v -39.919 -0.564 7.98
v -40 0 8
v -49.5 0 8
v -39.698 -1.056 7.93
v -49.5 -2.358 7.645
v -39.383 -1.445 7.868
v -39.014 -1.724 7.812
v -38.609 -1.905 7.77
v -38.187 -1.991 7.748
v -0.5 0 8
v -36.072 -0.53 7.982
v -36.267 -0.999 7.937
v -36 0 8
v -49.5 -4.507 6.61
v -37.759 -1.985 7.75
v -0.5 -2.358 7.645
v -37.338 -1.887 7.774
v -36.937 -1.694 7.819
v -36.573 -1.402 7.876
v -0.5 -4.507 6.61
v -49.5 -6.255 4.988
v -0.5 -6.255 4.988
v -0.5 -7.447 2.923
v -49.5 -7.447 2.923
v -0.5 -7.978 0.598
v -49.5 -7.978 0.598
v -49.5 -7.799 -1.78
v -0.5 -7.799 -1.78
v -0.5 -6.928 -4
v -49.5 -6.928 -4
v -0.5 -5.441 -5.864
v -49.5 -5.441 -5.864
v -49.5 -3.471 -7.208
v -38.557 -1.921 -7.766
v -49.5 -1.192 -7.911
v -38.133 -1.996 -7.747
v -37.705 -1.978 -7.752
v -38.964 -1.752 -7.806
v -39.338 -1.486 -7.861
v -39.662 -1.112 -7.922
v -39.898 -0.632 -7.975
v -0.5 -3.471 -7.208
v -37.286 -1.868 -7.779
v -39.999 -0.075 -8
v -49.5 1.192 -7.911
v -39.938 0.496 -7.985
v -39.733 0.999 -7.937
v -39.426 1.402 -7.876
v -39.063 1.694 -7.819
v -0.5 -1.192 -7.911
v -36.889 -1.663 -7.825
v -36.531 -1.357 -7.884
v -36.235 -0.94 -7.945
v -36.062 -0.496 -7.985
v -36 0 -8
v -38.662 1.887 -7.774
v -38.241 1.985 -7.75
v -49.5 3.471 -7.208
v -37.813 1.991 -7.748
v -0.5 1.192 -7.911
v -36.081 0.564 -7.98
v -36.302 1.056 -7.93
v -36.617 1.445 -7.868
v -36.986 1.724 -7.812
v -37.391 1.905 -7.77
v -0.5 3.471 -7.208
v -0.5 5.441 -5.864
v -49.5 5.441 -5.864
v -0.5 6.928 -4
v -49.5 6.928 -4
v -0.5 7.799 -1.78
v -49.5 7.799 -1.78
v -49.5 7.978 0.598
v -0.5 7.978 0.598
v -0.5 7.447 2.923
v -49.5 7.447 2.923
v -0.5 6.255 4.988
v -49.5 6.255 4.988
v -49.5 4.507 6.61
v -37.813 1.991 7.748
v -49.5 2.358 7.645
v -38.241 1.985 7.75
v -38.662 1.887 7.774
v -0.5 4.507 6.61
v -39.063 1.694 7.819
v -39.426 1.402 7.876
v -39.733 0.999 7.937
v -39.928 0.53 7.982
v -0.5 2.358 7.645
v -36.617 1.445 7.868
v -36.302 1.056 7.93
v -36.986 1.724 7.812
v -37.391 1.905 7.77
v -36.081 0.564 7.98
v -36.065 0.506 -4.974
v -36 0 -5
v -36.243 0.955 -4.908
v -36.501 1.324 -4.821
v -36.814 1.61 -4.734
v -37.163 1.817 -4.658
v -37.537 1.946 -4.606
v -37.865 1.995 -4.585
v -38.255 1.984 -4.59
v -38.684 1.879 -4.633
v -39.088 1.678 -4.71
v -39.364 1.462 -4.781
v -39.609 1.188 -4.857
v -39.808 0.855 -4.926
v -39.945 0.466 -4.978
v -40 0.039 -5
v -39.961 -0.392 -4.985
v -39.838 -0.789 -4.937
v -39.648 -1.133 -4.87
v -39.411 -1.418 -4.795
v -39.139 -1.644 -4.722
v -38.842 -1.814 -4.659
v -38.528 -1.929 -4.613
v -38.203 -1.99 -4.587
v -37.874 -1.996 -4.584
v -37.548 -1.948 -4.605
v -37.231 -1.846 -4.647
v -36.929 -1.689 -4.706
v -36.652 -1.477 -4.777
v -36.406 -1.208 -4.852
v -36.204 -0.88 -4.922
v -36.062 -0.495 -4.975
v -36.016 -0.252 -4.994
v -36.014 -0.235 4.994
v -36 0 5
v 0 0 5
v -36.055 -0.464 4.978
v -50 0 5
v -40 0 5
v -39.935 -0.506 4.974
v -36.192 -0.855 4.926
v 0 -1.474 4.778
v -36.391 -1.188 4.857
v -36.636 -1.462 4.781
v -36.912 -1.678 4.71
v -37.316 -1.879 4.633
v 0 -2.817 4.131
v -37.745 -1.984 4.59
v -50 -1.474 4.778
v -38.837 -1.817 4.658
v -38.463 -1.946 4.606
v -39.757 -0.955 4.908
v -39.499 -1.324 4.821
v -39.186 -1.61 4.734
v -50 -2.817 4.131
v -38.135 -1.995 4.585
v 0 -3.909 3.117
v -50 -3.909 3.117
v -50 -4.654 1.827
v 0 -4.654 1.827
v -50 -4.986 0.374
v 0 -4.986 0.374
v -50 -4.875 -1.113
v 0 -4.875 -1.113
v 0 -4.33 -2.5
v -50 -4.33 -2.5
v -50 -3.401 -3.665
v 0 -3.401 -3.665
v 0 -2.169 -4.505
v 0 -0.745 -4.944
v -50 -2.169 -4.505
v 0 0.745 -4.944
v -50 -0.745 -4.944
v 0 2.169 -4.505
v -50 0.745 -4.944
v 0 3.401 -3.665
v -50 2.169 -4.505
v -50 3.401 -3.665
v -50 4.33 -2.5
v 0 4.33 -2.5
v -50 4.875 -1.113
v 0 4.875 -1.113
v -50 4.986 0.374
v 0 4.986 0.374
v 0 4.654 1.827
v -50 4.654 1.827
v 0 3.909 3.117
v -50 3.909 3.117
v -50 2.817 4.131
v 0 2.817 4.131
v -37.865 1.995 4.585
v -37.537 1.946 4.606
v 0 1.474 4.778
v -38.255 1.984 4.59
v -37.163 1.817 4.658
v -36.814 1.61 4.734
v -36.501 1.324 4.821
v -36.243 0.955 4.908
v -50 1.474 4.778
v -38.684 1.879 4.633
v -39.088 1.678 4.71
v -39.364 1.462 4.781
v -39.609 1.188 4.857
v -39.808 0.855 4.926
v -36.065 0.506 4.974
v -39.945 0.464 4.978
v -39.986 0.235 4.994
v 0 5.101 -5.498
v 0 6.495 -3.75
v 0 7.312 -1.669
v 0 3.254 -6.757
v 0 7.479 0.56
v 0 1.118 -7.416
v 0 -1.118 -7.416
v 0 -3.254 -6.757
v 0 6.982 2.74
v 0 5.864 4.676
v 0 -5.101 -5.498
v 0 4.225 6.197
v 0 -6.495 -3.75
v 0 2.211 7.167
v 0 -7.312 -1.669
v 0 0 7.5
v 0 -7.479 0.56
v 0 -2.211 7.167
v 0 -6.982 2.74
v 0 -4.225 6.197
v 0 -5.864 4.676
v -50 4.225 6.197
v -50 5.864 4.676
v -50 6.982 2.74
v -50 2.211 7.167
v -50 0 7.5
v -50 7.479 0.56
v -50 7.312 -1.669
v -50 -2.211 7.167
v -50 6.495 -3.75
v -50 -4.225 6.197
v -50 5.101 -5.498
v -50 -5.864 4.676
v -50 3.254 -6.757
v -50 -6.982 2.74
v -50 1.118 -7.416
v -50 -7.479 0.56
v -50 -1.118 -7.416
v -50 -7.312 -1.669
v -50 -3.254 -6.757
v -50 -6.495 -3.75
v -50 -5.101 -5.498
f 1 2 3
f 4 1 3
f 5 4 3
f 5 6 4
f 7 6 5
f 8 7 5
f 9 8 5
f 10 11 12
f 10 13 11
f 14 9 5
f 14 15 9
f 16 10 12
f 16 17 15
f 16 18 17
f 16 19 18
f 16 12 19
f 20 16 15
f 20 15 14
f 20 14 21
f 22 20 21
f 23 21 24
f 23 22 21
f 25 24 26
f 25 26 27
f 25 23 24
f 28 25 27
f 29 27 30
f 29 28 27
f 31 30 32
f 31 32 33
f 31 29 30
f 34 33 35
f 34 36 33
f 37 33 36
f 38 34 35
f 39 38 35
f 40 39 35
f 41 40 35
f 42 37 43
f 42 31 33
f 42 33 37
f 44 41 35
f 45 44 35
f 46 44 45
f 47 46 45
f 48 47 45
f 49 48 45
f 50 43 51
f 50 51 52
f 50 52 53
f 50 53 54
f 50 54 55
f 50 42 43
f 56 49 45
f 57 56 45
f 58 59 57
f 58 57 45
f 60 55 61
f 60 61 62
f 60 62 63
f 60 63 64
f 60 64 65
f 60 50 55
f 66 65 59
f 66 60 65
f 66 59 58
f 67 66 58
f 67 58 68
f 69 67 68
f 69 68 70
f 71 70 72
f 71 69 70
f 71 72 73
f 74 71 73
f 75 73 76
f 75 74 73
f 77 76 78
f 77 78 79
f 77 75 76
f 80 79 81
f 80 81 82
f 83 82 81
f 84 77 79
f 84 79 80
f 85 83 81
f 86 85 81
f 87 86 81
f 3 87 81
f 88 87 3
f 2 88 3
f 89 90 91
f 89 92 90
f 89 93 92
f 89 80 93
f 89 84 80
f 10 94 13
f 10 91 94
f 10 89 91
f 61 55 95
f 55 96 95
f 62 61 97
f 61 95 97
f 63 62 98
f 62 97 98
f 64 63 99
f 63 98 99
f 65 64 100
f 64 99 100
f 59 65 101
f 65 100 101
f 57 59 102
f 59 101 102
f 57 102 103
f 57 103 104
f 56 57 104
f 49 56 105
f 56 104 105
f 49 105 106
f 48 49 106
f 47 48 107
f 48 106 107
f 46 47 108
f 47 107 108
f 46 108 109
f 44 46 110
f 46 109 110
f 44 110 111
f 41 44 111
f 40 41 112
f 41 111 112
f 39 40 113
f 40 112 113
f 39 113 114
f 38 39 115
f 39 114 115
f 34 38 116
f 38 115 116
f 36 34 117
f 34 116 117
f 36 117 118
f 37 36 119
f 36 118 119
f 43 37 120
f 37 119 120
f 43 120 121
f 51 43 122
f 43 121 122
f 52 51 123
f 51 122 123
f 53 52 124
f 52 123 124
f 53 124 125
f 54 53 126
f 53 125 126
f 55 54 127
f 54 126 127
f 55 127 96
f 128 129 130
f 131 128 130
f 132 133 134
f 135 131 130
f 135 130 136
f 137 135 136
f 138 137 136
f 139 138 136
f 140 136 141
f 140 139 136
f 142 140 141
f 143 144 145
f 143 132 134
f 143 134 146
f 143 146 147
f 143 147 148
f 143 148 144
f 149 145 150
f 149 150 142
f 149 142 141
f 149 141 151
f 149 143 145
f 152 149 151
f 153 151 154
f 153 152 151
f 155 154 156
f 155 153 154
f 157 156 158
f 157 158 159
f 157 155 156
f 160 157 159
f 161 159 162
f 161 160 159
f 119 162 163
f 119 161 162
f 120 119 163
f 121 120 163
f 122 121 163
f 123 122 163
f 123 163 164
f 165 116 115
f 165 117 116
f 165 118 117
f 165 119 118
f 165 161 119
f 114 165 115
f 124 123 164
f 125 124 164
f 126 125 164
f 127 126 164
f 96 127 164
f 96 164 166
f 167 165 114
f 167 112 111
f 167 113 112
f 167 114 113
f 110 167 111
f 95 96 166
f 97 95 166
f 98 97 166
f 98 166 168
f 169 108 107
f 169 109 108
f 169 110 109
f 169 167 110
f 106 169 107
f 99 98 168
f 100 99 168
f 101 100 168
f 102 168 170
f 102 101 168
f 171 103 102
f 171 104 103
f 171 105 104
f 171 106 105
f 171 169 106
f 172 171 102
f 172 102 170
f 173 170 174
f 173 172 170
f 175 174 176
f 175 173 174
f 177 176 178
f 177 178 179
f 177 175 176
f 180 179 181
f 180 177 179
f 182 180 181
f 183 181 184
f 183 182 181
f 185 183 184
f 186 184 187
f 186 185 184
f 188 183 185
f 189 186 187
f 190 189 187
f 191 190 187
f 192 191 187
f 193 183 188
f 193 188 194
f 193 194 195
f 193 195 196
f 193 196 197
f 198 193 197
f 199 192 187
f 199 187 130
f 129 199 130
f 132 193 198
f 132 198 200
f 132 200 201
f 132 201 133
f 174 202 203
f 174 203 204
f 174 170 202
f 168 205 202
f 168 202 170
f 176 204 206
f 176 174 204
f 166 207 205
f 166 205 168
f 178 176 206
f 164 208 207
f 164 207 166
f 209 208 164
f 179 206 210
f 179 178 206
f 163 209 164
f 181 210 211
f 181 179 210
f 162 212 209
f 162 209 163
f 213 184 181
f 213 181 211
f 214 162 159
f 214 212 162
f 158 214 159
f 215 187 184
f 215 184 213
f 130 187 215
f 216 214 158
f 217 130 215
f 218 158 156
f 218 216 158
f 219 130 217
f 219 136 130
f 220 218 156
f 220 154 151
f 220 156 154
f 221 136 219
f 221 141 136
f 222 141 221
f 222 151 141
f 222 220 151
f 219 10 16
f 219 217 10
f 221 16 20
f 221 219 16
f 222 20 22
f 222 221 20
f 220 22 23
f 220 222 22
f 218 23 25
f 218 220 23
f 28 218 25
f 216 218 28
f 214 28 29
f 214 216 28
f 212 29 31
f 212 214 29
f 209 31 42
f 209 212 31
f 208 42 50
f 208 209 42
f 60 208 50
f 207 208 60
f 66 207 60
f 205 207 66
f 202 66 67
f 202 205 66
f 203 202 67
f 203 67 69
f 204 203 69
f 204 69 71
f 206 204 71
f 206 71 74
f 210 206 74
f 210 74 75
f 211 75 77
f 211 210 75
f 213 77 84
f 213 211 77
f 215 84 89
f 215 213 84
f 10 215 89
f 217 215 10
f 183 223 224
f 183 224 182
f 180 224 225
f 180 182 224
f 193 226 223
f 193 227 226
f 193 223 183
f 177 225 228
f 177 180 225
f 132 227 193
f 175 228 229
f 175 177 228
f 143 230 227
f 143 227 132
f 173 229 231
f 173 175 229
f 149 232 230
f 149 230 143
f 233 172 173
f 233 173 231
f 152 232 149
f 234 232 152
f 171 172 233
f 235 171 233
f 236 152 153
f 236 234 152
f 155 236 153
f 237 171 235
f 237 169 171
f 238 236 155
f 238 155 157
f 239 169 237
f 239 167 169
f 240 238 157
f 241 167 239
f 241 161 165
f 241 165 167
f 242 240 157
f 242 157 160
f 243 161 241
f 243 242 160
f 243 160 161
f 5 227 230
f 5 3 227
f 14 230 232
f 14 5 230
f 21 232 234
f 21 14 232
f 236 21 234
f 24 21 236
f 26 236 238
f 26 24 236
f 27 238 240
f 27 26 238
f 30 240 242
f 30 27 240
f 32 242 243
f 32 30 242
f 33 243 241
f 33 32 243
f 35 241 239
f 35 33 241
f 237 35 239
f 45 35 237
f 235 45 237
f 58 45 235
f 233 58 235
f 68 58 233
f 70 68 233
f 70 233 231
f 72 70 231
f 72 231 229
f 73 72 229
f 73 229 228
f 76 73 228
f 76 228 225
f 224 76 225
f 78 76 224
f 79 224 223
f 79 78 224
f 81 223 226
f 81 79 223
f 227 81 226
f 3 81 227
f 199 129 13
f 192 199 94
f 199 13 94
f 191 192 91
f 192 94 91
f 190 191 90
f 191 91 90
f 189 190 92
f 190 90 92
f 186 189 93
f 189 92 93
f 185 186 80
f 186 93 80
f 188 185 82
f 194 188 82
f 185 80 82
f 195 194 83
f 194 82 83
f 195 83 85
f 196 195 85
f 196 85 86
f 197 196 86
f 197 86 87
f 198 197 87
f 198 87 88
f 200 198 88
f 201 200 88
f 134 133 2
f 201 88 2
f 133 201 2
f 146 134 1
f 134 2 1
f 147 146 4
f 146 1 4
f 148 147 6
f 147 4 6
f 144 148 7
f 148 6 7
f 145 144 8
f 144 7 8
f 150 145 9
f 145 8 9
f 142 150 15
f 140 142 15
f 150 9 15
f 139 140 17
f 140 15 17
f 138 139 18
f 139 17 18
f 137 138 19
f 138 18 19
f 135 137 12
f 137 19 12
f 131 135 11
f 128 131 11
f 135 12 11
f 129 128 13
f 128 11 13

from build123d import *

# Parameters (mm, degrees)
ESQUISSE2_R             = 2
ENL_V_MAT_EXTRU_1_DEPTH = 12.5


with BuildPart() as part:
    # Esquisse1 → Base-Révolution (revolve)
    with BuildSketch(Plane.XY):
        Polygon((-0.5, 8), (0, 7.5), (0, 5), (-50, 5), (-50, 7.5), (-49.5, 8), align=None)
    revolve(axis=Axis((-22.885527638, 0, 0), (1, 0, 0)))

    # Esquisse2 → Enlèv. mat.-Extru.1 (cut, symmetric)
    with BuildSketch(Plane.XY):
        with Locations((-38, 0)):
            Circle(ESQUISSE2_R)
    extrude(amount=ENL_V_MAT_EXTRU_1_DEPTH, both=True, mode=Mode.SUBTRACT)


solid = part.part
